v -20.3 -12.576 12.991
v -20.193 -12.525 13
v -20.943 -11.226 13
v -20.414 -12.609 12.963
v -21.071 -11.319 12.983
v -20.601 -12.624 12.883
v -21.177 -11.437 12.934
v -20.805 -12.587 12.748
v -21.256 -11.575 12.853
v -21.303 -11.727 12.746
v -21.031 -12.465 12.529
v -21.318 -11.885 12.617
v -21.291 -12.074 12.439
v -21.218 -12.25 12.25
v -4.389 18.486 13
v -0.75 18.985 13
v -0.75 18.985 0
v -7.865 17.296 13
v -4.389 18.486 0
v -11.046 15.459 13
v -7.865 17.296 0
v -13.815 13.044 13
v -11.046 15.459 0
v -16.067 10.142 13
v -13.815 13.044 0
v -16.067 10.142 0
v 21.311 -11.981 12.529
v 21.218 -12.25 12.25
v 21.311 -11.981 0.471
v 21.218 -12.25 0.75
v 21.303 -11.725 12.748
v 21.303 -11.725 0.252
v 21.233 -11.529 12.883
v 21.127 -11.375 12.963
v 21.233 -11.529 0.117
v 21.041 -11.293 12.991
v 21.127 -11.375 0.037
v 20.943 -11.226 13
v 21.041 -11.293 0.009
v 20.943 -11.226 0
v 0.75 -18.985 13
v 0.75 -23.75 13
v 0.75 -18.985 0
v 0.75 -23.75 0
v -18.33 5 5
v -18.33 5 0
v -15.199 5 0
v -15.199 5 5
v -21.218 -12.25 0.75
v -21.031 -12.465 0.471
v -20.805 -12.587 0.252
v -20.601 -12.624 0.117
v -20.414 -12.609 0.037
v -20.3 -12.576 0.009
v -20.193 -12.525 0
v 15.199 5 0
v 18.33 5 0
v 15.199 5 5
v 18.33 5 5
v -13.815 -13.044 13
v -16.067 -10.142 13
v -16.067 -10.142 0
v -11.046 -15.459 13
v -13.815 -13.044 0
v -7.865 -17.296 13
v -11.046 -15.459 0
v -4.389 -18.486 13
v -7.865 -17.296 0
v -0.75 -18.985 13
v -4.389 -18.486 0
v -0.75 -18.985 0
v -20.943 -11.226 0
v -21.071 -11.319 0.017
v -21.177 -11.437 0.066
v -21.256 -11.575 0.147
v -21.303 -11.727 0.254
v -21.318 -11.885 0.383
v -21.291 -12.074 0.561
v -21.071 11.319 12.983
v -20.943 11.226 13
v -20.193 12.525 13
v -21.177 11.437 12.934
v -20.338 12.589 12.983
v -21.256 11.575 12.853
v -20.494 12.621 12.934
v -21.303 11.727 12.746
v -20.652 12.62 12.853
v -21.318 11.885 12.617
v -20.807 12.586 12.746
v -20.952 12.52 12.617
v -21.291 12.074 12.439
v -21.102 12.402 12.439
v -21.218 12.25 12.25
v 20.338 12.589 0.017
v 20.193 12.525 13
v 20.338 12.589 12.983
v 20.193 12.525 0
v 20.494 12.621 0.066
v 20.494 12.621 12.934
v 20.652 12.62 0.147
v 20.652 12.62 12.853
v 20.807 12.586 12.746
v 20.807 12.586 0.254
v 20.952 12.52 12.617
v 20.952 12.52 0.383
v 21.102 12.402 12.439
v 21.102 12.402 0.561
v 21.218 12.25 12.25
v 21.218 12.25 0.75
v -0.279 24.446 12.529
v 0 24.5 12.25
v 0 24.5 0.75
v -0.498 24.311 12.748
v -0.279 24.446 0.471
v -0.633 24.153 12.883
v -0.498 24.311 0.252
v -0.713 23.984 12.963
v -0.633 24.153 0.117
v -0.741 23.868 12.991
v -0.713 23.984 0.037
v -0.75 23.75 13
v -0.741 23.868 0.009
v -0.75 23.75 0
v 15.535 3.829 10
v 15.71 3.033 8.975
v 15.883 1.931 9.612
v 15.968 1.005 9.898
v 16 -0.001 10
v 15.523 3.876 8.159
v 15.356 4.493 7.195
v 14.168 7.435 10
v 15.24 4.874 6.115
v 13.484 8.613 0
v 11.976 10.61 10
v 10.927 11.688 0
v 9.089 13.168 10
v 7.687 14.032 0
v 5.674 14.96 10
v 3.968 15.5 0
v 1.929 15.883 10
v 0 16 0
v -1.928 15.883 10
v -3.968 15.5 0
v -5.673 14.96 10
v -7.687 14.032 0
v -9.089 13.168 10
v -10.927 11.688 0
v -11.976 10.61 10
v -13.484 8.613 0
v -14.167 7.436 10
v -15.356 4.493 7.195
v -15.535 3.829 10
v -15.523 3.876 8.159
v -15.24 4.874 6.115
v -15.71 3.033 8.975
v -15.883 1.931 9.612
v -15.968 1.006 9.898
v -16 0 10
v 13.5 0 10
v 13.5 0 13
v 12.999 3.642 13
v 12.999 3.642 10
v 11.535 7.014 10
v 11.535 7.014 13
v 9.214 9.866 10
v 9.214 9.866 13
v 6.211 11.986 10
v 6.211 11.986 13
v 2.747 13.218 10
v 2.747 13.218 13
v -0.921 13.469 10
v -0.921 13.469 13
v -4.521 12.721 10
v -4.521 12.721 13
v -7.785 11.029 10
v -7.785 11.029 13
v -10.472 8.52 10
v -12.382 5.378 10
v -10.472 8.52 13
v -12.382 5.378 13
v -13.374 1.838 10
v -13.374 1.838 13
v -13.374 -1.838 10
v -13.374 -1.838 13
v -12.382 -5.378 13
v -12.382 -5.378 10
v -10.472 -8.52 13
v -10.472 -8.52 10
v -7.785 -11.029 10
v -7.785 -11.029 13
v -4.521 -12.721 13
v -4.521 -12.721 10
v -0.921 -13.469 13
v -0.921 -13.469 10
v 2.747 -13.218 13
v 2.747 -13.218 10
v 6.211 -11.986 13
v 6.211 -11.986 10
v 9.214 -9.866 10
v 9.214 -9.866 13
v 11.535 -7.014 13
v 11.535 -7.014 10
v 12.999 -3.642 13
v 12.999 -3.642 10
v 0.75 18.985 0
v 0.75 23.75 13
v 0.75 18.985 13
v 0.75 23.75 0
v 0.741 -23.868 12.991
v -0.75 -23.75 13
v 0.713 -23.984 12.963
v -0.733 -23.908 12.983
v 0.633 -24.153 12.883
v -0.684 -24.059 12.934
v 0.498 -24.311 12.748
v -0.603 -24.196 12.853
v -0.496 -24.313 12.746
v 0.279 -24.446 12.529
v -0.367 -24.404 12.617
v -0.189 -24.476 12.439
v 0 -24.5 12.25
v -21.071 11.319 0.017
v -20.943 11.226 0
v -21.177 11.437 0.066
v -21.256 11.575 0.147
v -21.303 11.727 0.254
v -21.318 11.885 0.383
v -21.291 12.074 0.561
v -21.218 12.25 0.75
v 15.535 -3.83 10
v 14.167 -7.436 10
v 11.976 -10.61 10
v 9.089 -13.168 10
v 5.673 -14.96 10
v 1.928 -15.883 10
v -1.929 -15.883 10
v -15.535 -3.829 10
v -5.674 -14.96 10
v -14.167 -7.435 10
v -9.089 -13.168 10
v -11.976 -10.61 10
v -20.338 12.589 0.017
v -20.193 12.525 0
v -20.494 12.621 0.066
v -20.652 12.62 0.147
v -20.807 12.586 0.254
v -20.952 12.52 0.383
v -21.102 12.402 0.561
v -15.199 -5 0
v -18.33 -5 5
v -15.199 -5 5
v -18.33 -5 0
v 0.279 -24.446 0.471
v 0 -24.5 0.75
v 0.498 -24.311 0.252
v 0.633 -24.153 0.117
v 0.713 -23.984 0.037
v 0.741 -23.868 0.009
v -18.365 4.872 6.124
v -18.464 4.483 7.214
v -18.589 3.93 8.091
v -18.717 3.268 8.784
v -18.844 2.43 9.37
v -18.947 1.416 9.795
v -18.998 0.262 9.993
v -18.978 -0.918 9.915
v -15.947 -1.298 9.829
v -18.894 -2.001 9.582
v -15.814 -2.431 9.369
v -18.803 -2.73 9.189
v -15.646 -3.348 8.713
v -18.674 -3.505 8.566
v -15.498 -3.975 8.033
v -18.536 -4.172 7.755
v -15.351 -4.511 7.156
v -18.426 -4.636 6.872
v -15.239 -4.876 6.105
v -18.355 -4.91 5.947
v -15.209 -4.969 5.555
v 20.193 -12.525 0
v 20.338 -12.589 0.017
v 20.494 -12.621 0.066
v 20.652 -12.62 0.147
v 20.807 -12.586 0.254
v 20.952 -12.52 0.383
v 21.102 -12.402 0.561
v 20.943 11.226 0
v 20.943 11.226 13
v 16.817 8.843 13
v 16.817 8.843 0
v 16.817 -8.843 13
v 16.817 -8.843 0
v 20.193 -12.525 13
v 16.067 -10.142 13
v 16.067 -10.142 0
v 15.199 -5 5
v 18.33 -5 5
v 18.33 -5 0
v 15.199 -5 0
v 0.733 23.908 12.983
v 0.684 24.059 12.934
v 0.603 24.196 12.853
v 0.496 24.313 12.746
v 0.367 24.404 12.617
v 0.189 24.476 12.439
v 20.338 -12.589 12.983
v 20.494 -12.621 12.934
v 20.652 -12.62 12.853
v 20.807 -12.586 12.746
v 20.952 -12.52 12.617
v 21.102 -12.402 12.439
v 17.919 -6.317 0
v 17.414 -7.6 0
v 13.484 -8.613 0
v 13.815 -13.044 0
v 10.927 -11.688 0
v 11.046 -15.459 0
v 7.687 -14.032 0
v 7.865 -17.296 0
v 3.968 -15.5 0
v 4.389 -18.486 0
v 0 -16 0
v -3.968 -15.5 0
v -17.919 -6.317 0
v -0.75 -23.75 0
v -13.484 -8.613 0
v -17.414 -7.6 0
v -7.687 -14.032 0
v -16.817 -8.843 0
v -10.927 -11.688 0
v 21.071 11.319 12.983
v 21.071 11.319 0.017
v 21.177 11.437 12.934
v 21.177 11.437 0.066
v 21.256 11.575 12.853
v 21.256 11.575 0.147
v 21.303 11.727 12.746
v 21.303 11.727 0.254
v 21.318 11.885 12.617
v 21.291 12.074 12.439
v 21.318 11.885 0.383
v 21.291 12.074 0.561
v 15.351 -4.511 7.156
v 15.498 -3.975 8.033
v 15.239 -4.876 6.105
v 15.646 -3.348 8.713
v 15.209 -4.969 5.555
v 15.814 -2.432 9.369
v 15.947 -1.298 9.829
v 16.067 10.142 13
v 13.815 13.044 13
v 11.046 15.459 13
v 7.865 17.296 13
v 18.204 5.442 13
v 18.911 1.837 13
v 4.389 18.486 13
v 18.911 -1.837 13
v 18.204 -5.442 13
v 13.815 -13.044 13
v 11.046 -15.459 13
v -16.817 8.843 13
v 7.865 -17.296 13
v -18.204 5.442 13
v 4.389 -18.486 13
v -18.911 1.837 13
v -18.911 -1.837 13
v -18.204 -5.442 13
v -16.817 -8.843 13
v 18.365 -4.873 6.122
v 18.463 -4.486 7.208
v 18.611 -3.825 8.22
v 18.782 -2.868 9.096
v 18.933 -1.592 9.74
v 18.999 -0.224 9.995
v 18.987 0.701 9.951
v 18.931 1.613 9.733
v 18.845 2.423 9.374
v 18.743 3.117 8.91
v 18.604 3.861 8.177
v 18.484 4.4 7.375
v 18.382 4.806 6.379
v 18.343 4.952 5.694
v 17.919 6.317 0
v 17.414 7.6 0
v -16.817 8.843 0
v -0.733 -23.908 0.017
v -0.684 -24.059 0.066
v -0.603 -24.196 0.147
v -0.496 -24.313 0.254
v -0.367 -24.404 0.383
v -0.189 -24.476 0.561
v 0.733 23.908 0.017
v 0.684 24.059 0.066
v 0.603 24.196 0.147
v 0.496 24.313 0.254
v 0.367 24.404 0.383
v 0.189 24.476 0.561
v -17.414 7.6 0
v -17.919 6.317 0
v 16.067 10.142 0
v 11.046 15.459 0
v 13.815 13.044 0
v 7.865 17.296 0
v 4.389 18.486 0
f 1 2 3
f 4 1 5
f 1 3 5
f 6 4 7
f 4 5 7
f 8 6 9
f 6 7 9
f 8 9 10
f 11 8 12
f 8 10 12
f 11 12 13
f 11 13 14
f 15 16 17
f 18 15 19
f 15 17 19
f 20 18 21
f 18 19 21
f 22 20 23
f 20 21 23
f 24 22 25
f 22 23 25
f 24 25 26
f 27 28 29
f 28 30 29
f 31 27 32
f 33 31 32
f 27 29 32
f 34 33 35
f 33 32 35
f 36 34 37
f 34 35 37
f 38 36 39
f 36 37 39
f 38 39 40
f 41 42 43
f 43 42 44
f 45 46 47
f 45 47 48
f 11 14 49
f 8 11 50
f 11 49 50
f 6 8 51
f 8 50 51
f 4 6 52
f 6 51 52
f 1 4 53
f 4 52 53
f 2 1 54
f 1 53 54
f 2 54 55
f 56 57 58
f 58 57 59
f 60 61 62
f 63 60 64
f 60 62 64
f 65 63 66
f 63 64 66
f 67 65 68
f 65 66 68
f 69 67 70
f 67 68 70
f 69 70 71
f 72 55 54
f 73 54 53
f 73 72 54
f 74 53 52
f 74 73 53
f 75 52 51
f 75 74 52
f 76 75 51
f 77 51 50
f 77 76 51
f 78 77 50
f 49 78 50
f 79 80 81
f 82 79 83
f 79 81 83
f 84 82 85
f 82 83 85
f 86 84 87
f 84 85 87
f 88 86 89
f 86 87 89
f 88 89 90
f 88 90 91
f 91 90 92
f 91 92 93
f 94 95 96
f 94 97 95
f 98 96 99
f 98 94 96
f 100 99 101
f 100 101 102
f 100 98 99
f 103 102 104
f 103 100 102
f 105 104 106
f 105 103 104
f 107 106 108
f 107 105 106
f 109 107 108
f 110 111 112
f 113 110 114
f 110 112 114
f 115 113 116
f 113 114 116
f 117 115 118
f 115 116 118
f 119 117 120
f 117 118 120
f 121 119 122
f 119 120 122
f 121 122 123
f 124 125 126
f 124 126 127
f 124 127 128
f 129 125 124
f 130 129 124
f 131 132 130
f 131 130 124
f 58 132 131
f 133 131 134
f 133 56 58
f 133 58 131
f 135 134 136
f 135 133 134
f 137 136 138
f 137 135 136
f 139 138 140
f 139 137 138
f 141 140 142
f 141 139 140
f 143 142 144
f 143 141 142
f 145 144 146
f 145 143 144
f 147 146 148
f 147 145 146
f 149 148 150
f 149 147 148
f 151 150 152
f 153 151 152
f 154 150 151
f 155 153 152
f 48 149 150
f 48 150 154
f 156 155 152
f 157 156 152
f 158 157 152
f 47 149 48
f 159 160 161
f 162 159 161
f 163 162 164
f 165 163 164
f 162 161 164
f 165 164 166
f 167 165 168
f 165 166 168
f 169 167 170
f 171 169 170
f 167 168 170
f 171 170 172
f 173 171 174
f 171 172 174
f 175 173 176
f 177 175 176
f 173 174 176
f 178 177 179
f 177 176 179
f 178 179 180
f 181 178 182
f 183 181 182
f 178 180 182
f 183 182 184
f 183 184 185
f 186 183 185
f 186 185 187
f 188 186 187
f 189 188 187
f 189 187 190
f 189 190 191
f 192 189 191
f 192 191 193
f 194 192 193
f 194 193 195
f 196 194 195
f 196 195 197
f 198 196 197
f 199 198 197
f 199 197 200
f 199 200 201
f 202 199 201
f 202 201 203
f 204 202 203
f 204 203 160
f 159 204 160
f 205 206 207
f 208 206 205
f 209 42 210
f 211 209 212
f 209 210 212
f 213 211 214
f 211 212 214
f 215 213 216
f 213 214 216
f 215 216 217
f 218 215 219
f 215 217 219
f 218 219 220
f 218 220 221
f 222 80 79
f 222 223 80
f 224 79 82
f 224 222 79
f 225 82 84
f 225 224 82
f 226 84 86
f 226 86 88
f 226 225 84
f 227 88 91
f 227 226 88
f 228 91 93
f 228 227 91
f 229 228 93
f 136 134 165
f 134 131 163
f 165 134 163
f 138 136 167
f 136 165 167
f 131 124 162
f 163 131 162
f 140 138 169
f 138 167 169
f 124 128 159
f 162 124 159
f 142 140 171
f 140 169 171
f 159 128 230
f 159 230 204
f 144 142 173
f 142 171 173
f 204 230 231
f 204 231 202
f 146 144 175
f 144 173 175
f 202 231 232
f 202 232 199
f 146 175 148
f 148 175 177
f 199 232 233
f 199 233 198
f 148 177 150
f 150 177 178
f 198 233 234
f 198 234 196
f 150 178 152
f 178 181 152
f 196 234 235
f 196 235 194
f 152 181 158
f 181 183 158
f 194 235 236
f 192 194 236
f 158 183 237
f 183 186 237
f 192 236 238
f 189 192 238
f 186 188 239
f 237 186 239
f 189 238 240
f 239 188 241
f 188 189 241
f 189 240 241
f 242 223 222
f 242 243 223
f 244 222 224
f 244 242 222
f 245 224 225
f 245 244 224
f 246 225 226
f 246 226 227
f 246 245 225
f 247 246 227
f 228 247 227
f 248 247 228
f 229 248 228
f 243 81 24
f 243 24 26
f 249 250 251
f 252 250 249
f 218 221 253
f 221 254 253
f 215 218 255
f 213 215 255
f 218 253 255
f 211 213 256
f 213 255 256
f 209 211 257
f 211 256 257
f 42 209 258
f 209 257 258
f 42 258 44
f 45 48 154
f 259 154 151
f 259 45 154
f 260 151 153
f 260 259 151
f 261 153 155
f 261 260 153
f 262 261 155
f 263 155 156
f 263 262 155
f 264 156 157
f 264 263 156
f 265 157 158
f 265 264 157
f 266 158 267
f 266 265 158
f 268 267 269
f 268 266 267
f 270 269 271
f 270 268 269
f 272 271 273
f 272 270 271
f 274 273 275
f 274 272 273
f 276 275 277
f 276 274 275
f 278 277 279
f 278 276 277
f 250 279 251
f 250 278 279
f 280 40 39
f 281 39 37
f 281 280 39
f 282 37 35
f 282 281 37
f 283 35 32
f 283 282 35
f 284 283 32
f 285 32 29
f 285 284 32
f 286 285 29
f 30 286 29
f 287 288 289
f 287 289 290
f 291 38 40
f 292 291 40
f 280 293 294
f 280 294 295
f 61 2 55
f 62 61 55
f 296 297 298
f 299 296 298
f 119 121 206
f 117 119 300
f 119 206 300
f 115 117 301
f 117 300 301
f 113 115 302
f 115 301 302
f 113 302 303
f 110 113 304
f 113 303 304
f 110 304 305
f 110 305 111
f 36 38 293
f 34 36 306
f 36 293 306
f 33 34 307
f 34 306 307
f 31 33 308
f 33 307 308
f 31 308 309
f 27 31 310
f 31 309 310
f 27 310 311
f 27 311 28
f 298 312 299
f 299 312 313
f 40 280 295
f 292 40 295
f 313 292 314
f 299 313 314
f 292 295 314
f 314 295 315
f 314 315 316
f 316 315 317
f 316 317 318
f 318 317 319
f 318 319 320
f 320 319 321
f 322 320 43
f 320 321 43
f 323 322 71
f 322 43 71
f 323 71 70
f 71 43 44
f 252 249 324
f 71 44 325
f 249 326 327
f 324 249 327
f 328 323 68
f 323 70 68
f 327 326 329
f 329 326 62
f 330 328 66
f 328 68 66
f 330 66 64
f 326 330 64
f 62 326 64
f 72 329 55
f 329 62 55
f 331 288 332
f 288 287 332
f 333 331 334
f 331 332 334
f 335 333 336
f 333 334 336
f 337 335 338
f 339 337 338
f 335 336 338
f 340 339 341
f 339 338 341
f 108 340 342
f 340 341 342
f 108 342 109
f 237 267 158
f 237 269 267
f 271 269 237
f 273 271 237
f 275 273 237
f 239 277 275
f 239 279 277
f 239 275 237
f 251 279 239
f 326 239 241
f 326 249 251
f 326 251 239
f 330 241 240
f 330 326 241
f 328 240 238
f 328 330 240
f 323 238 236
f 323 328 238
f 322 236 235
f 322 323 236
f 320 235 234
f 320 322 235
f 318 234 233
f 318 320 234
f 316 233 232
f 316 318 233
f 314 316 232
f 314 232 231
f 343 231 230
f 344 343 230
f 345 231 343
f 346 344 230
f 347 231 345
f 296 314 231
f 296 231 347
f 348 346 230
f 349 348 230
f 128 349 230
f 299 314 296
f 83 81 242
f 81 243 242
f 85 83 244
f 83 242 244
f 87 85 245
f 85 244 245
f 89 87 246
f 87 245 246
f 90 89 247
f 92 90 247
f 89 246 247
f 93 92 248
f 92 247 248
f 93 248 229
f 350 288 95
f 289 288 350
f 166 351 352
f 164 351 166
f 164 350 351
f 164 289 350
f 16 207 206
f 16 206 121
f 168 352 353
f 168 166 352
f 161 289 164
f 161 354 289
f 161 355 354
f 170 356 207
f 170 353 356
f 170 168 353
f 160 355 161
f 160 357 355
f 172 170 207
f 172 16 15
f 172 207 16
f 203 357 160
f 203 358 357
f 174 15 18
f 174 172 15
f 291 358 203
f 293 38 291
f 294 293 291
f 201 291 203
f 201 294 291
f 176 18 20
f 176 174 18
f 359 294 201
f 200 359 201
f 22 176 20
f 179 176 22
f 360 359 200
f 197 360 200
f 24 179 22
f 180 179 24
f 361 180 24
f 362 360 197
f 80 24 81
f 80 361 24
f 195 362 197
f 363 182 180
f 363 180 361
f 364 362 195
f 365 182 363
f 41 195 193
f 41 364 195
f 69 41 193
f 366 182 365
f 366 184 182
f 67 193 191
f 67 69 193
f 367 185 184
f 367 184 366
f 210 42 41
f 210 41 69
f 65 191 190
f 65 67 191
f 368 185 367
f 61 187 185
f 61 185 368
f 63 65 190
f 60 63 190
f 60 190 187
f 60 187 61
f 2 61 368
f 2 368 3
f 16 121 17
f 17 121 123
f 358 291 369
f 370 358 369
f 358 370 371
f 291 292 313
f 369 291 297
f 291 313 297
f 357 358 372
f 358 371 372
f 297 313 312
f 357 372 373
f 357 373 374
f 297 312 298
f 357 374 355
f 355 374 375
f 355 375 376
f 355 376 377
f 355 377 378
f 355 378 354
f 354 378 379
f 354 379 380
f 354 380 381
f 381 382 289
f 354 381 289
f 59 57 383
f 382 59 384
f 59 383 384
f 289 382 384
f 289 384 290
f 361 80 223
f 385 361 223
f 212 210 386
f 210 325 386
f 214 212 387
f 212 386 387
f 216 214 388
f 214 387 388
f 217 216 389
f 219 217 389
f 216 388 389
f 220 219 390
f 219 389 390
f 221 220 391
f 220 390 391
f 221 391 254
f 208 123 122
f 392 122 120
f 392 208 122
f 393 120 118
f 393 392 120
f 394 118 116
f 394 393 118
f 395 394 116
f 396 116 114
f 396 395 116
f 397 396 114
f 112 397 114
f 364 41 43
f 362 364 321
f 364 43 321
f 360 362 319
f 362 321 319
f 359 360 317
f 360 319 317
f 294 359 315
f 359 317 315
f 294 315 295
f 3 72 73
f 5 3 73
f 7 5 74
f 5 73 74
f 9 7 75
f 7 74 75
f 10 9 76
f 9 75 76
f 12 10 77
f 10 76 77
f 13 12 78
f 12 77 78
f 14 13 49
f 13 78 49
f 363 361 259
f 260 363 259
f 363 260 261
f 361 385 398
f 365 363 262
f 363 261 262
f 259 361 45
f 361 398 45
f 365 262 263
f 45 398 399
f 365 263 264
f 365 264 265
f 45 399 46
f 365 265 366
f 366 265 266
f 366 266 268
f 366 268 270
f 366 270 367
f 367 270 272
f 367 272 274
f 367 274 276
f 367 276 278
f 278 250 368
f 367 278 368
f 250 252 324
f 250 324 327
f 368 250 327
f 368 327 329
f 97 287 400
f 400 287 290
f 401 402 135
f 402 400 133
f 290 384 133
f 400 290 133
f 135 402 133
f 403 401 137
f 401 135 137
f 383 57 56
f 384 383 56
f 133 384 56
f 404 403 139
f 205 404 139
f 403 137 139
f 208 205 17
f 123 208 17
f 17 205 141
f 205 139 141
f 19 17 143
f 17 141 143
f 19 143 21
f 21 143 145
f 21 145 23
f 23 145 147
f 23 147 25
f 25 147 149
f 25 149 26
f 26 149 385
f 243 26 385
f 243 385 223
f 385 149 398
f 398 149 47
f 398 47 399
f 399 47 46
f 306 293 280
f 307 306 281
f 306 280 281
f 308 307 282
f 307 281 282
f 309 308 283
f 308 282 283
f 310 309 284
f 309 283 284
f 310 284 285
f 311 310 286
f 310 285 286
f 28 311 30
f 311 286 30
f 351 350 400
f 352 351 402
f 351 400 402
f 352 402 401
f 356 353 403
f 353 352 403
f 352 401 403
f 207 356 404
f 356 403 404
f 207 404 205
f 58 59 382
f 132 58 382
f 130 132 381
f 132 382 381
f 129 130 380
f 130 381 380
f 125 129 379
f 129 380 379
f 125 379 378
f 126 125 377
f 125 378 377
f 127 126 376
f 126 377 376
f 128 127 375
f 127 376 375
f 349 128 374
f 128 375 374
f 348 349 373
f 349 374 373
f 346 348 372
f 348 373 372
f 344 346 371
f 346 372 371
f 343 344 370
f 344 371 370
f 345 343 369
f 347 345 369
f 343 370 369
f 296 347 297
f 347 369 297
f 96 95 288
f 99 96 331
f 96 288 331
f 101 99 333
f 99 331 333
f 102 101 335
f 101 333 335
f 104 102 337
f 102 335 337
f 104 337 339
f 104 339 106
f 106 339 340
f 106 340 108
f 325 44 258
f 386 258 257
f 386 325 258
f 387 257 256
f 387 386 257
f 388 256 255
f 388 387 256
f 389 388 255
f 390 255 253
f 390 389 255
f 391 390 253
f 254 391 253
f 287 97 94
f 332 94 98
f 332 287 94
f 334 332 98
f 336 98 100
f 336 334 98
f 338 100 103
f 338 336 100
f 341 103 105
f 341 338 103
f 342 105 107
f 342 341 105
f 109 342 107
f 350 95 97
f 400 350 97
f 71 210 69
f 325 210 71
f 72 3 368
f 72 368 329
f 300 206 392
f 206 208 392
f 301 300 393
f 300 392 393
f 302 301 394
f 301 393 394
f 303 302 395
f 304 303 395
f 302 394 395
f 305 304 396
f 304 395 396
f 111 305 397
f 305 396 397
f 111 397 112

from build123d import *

# Parameters (mm, degrees)
CONTOUR_R                                    = 19
BOSS_EXTRU_1_CONTOUR_DEPTH                   = 13
COQUE1_T                                     = -3
ENL_V_MAT_EXTRU_1_OUVERTUE_AIMANT_REACH      = 46.43
ENL_V_MAT_EXTRU_1_OUVERTUE_AIMANT_END_RADIUS = 16
ENL_V_MAT_EXTRU_2_OUVERTURE_CROU_REACH       = 31.85
OUVERTURE_CROU_R                             = 13.5
BOSS_EXTRU_2_AILETTES_REACH                  = 51.216
BOSS_EXTRU_2_AILETTES_END_RADIUS             = 19
AILETTES_W                                   = 1.5
AILETTES_H                                   = 13
R_P_TITION_CIRCULAIRE4_AILETTES_COUNT        = 6
CONG_1_AILETTES_R                            = 0.75


with BuildPart() as part:
    # Contour → Boss.-Extru.1_Contour (new body)
    with BuildSketch(Plane.XY):
        with Locations(Location((0, 0, 0), (0, 0, 180))):
            Circle(CONTOUR_R)
    extrude(amount=BOSS_EXTRU_1_CONTOUR_DEPTH)

    # Coque1
    coque1_openings = [part.faces().sort_by_distance(p)[0] for p in [
        (0, 0, 0),
    ]]
    offset(amount=COQUE1_T, openings=coque1_openings, kind=Kind.INTERSECTION)

    # Enlèv. mat.-Extru.1_Ouvertue_aimant: up to this cylinder (the profile starts outside it)
    enl_v_mat_extru_1_ouvertue_aimant_end = Plane(origin=(0, 0, 4.533251), z_dir=(0, 0, -1)) * Cylinder(ENL_V_MAT_EXTRU_1_OUVERTUE_AIMANT_END_RADIUS, 125.86, mode=Mode.PRIVATE)
    # Ouvertue_aimant → Enlèv. mat.-Extru.1_Ouvertue_aimant (cut, up to the surface)
    with BuildSketch(Plane(origin=(19, 0, 0), x_dir=(0, 0, -1), z_dir=(1, 0, 0)), mode=Mode.PRIVATE) as enl_v_mat_extru_1_ouvertue_aimant_sk1:
        with BuildLine():
            Line((0, 5), (-5, 5))
            ThreePointArc((-5, 5), (-10, 0), (-5, -5))
            Line((-5, -5), (0, -5))
            Line((0, -5), (0, 5))
        make_face()
    enl_v_mat_extru_1_ouvertue_aimant_tool1 = extrude(enl_v_mat_extru_1_ouvertue_aimant_sk1.sketch, amount=-ENL_V_MAT_EXTRU_1_OUVERTUE_AIMANT_REACH, mode=Mode.PRIVATE) - enl_v_mat_extru_1_ouvertue_aimant_end
    enl_v_mat_extru_1_ouvertue_aimant = enl_v_mat_extru_1_ouvertue_aimant_tool1.solids().sort_by_distance((19, 0, 4.533251))[0]
    add(enl_v_mat_extru_1_ouvertue_aimant, mode=Mode.SUBTRACT)

    # Symétrie1_Ouvertue_aimant: Enlèv. mat.-Extru.1_Ouvertue_aimant across plane
    add(enl_v_mat_extru_1_ouvertue_aimant.mirror(Plane(origin=(0, 0, 0), x_dir=(0, 0, 1), z_dir=(1, 0, 0))), mode=Mode.SUBTRACT)

    # Ouverture_Écrou → Enlèv. mat.-Extru.2_Ouverture_Écrou (cut, up to next)
    with BuildSketch(Plane.XY.offset(13), mode=Mode.PRIVATE) as enl_v_mat_extru_2_ouverture_crou_sk1:
        Circle(OUVERTURE_CROU_R)
    enl_v_mat_extru_2_ouverture_crou_tool1 = extrude(enl_v_mat_extru_2_ouverture_crou_sk1.sketch, amount=-ENL_V_MAT_EXTRU_2_OUVERTURE_CROU_REACH, mode=Mode.PRIVATE) & part.part
    add(enl_v_mat_extru_2_ouverture_crou_tool1.solids().sort_by_distance((0, 0, 13))[0], mode=Mode.SUBTRACT)

    # Boss.-Extru.2_Ailettes: up to this cylinder (the profile starts outside it)
    boss_extru_2_ailettes_end = Plane(origin=(0, 0, 6.5), z_dir=(0, 0, -1)) * Cylinder(BOSS_EXTRU_2_AILETTES_END_RADIUS, 141.432, mode=Mode.PRIVATE)
    # Ailettes → Boss.-Extru.2_Ailettes (add, up to the surface)
    with BuildSketch(Plane(origin=(0, 24.5, 0), x_dir=(1, 0, 0), z_dir=(0, 1, 0)), mode=Mode.PRIVATE) as boss_extru_2_ailettes_sk1:
        with Locations((0, -6.5)):
            Rectangle(AILETTES_W, AILETTES_H)
    boss_extru_2_ailettes_tool1 = extrude(boss_extru_2_ailettes_sk1.sketch, amount=-BOSS_EXTRU_2_AILETTES_REACH, mode=Mode.PRIVATE) - boss_extru_2_ailettes_end
    boss_extru_2_ailettes = boss_extru_2_ailettes_tool1.solids().sort_by_distance((0, 24.5, 6.5))[0]
    add(boss_extru_2_ailettes)

    # Répétition circulaire4_Ailettes: Boss.-Extru.2_Ailettes ×6 about axis
    r_p_tition_circulaire4_ailettes_axis = Axis((0, 0, 0), (0, 0, 1))
    for i in range(1, R_P_TITION_CIRCULAIRE4_AILETTES_COUNT):
        add(boss_extru_2_ailettes.rotate(r_p_tition_circulaire4_ailettes_axis, i * 360 / R_P_TITION_CIRCULAIRE4_AILETTES_COUNT))

    # Congé1_Ailettes
    cong_1_ailettes_edges = [part.edges().sort_by_distance(p)[0] for p in [
        (-20.842622393, -12.899519053, 6.5),
        (-21.217622393, -12.25, 13),
        (-21.592622393, -11.600480947, 6.5),
        (-21.217622393, -12.25, 0),
        (-21.592622393, 11.600480947, 6.5),
        (-21.217622393, 12.25, 13),
        (-20.842622393, 12.899519053, 6.5),
        (-21.217622393, 12.25, 0),
        (-0.75, 24.5, 6.5),
        (0, 24.5, 13),
        (0.75, 24.5, 6.5),
        (0, 24.5, 0),
        (20.842622393, 12.899519053, 6.5),
        (21.217622393, 12.25, 13),
        (21.592622393, 11.600480947, 6.5),
        (21.217622393, 12.25, 0),
        (21.592622393, -11.600480947, 6.5),
        (21.217622393, -12.25, 13),
        (20.842622393, -12.899519053, 6.5),
        (21.217622393, -12.25, 0),
        (0.75, -24.5, 6.5),
        (0, -24.5, 13),
        (-0.75, -24.5, 6.5),
        (0, -24.5, 0),
    ]]
    fillet(cong_1_ailettes_edges, radius=CONG_1_AILETTES_R - 0.0001)  # a hair under: the kernel refuses the full size


solid = part.part
